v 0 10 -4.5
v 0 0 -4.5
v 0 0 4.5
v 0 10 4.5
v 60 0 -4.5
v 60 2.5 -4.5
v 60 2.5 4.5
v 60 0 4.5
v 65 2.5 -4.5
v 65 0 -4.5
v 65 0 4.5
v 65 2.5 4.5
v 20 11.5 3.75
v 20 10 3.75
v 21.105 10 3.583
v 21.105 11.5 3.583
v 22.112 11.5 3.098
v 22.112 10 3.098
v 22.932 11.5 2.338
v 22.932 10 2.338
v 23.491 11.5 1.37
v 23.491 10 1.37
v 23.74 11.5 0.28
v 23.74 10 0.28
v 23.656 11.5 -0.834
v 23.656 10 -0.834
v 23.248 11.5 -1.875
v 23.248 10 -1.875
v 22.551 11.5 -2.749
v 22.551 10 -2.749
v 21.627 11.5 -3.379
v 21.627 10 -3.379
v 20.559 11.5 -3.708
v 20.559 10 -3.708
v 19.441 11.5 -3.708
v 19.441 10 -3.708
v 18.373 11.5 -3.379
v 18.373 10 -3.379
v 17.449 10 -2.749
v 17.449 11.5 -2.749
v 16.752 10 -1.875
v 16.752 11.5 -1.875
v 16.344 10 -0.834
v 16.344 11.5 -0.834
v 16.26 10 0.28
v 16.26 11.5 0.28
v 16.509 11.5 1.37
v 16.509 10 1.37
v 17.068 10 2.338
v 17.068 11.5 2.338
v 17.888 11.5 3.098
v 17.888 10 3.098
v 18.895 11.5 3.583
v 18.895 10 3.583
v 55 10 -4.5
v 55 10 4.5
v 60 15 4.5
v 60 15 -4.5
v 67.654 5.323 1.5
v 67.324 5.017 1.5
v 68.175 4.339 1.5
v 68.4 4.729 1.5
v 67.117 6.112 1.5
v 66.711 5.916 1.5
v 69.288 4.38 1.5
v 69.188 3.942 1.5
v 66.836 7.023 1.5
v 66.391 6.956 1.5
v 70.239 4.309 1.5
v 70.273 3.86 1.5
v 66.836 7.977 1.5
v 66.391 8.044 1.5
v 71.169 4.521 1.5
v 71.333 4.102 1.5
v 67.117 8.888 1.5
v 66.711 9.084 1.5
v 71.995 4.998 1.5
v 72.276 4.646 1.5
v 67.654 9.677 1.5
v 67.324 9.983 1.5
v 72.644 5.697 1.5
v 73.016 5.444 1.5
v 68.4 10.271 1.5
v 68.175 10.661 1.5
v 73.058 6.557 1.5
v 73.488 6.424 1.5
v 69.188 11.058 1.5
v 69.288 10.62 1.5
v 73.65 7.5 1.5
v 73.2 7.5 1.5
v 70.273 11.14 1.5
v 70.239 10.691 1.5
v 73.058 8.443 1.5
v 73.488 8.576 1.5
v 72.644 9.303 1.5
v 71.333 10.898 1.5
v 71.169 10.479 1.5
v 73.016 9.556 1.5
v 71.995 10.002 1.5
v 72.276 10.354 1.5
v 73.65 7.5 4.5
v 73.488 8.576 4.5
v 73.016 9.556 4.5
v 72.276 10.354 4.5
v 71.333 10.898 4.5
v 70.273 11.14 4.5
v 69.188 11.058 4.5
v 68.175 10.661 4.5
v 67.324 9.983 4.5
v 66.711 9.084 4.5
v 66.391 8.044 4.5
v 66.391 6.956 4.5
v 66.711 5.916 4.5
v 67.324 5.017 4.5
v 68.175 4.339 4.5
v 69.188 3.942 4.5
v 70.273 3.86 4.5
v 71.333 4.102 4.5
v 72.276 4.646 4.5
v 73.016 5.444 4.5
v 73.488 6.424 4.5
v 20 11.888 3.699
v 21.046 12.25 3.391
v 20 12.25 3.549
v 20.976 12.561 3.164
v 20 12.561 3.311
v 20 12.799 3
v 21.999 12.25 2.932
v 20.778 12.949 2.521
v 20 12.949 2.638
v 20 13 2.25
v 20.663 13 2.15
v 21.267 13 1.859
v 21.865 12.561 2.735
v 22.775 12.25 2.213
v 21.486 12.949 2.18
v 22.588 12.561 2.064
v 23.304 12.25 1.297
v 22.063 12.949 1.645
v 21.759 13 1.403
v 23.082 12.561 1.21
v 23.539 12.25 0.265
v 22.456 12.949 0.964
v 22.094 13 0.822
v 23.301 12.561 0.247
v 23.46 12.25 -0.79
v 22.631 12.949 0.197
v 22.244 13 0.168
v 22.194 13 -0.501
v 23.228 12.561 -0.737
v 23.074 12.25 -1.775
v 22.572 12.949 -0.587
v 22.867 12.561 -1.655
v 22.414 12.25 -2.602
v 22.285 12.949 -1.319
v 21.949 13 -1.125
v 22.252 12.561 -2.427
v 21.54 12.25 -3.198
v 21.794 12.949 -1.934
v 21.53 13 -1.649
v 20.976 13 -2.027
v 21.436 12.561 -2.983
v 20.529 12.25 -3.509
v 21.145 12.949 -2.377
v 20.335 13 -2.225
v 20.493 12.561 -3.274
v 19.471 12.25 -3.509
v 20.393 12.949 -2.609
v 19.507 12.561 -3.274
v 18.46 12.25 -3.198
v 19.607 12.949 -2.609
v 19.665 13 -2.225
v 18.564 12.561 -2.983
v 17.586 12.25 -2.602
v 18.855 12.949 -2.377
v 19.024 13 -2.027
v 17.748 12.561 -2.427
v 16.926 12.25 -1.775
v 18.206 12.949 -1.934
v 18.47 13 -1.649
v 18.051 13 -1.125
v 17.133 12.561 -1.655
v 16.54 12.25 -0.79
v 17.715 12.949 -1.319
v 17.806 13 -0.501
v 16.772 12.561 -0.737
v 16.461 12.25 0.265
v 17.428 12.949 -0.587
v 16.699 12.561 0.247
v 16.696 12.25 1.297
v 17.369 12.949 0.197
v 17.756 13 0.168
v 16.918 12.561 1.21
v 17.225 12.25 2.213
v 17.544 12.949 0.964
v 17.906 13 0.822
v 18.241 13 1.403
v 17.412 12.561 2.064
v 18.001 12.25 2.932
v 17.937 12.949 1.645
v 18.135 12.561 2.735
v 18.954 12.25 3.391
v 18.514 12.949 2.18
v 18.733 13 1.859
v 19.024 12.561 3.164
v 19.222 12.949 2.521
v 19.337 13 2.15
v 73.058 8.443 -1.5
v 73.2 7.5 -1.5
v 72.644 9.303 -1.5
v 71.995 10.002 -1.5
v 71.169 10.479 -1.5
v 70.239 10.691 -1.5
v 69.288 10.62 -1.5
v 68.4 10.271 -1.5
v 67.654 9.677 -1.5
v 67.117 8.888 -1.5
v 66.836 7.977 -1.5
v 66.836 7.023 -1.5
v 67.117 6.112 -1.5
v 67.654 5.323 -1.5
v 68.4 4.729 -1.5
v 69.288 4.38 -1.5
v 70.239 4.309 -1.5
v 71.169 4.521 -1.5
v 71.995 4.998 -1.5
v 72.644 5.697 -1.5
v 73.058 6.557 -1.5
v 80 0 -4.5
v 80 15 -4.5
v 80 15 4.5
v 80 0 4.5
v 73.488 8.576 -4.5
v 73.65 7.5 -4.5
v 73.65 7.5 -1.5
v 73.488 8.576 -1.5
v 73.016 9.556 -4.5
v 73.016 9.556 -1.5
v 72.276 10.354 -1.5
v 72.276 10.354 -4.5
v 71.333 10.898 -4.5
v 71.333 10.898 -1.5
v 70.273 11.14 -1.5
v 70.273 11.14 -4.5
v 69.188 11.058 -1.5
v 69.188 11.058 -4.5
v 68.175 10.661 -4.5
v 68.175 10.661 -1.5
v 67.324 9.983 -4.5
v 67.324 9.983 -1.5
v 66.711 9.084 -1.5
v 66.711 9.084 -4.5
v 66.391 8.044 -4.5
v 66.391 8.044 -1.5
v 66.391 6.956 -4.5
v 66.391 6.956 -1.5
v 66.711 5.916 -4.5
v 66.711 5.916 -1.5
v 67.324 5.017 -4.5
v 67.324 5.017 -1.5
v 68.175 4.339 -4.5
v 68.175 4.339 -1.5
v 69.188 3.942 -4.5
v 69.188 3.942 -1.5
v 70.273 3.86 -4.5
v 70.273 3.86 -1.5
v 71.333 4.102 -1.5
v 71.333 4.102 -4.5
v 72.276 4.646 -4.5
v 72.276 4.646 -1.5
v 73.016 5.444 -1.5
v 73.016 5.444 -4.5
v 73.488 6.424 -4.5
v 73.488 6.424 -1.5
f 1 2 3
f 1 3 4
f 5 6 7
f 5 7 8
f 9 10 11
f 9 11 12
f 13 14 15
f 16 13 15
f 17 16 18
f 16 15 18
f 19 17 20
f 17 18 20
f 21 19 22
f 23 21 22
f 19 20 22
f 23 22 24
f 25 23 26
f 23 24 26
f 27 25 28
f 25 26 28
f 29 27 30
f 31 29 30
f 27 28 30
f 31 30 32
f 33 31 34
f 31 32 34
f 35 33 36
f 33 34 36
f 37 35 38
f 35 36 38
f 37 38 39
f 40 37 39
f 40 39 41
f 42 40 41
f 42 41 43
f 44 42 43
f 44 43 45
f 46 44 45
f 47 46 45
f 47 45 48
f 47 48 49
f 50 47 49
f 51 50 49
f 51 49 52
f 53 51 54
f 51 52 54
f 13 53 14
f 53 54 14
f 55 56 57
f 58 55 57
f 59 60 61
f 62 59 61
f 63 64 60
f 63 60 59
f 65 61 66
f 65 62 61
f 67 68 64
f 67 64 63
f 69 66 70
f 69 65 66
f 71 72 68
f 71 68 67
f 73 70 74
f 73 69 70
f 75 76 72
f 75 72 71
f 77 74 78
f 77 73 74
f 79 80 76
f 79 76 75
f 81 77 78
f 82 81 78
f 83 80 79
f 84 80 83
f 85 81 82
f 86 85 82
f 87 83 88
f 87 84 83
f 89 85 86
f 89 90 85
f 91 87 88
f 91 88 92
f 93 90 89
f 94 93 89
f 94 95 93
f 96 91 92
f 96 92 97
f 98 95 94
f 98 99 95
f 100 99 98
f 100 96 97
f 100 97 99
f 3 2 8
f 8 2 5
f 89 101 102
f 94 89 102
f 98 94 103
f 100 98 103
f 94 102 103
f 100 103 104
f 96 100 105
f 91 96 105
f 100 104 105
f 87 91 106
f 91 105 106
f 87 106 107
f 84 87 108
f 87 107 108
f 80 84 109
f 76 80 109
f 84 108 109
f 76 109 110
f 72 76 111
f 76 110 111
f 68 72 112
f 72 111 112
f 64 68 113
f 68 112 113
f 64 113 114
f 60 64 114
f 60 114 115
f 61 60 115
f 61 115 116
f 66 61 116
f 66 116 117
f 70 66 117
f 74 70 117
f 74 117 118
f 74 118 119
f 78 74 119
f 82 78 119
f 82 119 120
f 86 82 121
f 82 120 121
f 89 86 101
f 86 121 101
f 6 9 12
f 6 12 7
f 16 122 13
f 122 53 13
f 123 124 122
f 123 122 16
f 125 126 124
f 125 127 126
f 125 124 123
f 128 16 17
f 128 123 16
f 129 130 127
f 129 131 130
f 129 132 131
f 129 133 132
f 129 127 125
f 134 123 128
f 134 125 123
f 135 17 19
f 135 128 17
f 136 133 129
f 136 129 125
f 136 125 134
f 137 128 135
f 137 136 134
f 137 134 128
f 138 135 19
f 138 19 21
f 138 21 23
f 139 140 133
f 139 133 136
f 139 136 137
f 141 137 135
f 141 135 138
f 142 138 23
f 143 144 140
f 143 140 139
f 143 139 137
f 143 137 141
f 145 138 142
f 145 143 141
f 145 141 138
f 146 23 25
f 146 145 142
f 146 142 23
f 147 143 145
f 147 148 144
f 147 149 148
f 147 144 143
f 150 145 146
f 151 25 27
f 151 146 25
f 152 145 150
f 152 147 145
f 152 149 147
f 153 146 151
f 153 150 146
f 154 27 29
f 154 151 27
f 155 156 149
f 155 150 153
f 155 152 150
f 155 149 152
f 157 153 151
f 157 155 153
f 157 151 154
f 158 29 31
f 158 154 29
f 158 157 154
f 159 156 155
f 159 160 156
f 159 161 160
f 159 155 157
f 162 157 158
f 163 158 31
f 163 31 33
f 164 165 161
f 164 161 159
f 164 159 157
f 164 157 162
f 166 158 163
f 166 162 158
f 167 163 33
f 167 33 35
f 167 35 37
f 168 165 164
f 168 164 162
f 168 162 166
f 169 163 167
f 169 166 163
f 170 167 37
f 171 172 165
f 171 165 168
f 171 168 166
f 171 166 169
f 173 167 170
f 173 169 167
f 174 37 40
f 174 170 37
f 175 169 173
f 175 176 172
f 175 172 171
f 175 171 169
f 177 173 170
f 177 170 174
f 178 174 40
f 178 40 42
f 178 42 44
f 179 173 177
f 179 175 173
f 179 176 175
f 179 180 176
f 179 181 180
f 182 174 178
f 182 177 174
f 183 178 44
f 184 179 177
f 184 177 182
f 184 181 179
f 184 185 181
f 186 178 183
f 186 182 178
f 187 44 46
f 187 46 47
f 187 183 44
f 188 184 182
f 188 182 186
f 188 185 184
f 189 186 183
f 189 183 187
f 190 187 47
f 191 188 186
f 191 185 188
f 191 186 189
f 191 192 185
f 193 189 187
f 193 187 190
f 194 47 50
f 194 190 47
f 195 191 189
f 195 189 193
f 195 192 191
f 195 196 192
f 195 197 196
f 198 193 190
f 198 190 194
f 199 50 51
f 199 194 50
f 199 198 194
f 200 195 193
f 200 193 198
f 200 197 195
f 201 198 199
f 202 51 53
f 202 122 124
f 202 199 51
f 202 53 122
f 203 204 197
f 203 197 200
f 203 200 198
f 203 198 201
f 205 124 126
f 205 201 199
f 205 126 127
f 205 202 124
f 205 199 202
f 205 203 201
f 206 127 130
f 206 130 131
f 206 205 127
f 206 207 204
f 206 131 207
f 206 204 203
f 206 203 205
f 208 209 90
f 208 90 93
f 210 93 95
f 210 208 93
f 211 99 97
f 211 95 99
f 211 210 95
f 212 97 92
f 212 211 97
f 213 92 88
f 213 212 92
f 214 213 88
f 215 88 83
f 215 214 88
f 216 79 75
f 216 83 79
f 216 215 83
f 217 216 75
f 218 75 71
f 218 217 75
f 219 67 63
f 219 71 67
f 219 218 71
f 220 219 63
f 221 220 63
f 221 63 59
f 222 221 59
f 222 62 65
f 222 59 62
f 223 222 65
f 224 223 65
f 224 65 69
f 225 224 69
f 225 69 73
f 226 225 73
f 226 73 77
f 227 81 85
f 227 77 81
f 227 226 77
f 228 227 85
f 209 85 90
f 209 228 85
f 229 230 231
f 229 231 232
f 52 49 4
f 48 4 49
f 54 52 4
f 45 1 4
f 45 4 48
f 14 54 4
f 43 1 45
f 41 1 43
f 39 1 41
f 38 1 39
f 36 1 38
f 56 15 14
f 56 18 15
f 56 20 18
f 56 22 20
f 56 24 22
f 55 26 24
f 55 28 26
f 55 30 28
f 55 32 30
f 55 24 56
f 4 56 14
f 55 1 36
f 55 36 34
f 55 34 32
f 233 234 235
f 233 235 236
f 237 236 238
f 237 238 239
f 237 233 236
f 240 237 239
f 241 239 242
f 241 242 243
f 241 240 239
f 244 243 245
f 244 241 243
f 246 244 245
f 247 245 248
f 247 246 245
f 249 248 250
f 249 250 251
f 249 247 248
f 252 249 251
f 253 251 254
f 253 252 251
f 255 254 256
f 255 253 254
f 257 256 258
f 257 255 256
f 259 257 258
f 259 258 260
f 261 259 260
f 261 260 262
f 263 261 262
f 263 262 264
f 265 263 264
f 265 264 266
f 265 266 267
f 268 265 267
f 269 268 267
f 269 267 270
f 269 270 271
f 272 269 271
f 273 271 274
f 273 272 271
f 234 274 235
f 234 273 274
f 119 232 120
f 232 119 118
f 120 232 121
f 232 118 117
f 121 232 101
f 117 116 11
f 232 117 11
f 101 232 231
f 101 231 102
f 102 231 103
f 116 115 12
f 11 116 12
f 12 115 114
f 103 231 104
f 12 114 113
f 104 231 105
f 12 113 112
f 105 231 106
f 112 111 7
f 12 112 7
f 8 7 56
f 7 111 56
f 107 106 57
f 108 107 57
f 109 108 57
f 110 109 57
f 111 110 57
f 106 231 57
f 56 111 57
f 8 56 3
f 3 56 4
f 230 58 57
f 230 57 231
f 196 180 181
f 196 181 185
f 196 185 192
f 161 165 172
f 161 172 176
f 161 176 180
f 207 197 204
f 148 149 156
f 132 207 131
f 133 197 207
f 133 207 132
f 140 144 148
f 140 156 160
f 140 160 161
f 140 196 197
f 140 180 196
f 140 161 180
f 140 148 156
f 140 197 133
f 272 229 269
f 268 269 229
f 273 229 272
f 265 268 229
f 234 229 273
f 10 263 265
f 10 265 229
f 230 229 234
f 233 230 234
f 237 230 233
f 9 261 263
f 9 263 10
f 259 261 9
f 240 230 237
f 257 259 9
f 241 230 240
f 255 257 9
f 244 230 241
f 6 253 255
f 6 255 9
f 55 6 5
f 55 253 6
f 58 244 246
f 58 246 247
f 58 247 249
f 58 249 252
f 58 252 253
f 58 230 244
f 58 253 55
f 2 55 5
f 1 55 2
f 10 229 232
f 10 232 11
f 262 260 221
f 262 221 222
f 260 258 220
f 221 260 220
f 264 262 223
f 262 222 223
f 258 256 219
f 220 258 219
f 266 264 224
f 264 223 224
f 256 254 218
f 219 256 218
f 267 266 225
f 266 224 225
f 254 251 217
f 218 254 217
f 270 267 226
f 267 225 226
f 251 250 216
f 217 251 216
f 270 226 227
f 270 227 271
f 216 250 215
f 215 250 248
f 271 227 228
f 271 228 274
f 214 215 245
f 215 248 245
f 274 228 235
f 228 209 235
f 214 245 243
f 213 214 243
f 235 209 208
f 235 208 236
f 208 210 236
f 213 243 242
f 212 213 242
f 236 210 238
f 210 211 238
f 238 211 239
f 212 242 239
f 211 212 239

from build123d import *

# Parameters (mm, degrees)
EXTRUDE_635_DEPTH      = 4.5
EXTRUDE_635_DEPTH_BACK = 4.5
SKETCH_1_R             = 3.2
SKETCH_3_R             = 3.65
CUT_EXTRUDE_1173_DEPTH = 3
SKETCH_5_R             = 3.75
EXTRUDE_1353_DEPTH     = 3
FILLET_3_R             = 1.5


with BuildPart() as part:
    # Эскиз1 → Extrude 635 (new, two sides: drawn at the far end of the back side and taken through both)
    with BuildSketch(Plane.XY.offset(-EXTRUDE_635_DEPTH_BACK)):
        Polygon((0, 10), (55, 10), (60, 15), (80, 15), (80, 0), (65, 0), (65, 2.5), (60, 2.5), (60, 0), (13, 0), (0, 0), align=None)
        with Locations((70, 7.5)):
            Circle(SKETCH_1_R, mode=Mode.SUBTRACT)
    extrude(amount=EXTRUDE_635_DEPTH + EXTRUDE_635_DEPTH_BACK)

    # Эскиз3 → Cut-Extrude 1173 (cut)
    with BuildSketch(Plane.XY.offset(4.5)):
        with Locations((70, 7.5)):
            Circle(SKETCH_3_R)
    cut_extrude_1173 = extrude(amount=-CUT_EXTRUDE_1173_DEPTH, mode=Mode.SUBTRACT)

    # Зеркальное отражение1: Cut-Extrude 1173 across plane
    add(cut_extrude_1173.mirror(Plane.XY), mode=Mode.SUBTRACT)

    # Эскиз5 → Extrude 1353 (add)
    with BuildSketch(Plane(origin=(0, 10, 0), x_dir=(1, 0, 0), z_dir=(0, 1, 0))):
        with Locations((20, 0)):
            Circle(SKETCH_5_R)
    extrude(amount=EXTRUDE_1353_DEPTH)

    # Скругление3
    fillet_3_edges = [part.edges().sort_by_distance(p)[0] for p in [
        (16.25, 13, 0),
    ]]
    fillet(fillet_3_edges, radius=FILLET_3_R)


solid = part.part
